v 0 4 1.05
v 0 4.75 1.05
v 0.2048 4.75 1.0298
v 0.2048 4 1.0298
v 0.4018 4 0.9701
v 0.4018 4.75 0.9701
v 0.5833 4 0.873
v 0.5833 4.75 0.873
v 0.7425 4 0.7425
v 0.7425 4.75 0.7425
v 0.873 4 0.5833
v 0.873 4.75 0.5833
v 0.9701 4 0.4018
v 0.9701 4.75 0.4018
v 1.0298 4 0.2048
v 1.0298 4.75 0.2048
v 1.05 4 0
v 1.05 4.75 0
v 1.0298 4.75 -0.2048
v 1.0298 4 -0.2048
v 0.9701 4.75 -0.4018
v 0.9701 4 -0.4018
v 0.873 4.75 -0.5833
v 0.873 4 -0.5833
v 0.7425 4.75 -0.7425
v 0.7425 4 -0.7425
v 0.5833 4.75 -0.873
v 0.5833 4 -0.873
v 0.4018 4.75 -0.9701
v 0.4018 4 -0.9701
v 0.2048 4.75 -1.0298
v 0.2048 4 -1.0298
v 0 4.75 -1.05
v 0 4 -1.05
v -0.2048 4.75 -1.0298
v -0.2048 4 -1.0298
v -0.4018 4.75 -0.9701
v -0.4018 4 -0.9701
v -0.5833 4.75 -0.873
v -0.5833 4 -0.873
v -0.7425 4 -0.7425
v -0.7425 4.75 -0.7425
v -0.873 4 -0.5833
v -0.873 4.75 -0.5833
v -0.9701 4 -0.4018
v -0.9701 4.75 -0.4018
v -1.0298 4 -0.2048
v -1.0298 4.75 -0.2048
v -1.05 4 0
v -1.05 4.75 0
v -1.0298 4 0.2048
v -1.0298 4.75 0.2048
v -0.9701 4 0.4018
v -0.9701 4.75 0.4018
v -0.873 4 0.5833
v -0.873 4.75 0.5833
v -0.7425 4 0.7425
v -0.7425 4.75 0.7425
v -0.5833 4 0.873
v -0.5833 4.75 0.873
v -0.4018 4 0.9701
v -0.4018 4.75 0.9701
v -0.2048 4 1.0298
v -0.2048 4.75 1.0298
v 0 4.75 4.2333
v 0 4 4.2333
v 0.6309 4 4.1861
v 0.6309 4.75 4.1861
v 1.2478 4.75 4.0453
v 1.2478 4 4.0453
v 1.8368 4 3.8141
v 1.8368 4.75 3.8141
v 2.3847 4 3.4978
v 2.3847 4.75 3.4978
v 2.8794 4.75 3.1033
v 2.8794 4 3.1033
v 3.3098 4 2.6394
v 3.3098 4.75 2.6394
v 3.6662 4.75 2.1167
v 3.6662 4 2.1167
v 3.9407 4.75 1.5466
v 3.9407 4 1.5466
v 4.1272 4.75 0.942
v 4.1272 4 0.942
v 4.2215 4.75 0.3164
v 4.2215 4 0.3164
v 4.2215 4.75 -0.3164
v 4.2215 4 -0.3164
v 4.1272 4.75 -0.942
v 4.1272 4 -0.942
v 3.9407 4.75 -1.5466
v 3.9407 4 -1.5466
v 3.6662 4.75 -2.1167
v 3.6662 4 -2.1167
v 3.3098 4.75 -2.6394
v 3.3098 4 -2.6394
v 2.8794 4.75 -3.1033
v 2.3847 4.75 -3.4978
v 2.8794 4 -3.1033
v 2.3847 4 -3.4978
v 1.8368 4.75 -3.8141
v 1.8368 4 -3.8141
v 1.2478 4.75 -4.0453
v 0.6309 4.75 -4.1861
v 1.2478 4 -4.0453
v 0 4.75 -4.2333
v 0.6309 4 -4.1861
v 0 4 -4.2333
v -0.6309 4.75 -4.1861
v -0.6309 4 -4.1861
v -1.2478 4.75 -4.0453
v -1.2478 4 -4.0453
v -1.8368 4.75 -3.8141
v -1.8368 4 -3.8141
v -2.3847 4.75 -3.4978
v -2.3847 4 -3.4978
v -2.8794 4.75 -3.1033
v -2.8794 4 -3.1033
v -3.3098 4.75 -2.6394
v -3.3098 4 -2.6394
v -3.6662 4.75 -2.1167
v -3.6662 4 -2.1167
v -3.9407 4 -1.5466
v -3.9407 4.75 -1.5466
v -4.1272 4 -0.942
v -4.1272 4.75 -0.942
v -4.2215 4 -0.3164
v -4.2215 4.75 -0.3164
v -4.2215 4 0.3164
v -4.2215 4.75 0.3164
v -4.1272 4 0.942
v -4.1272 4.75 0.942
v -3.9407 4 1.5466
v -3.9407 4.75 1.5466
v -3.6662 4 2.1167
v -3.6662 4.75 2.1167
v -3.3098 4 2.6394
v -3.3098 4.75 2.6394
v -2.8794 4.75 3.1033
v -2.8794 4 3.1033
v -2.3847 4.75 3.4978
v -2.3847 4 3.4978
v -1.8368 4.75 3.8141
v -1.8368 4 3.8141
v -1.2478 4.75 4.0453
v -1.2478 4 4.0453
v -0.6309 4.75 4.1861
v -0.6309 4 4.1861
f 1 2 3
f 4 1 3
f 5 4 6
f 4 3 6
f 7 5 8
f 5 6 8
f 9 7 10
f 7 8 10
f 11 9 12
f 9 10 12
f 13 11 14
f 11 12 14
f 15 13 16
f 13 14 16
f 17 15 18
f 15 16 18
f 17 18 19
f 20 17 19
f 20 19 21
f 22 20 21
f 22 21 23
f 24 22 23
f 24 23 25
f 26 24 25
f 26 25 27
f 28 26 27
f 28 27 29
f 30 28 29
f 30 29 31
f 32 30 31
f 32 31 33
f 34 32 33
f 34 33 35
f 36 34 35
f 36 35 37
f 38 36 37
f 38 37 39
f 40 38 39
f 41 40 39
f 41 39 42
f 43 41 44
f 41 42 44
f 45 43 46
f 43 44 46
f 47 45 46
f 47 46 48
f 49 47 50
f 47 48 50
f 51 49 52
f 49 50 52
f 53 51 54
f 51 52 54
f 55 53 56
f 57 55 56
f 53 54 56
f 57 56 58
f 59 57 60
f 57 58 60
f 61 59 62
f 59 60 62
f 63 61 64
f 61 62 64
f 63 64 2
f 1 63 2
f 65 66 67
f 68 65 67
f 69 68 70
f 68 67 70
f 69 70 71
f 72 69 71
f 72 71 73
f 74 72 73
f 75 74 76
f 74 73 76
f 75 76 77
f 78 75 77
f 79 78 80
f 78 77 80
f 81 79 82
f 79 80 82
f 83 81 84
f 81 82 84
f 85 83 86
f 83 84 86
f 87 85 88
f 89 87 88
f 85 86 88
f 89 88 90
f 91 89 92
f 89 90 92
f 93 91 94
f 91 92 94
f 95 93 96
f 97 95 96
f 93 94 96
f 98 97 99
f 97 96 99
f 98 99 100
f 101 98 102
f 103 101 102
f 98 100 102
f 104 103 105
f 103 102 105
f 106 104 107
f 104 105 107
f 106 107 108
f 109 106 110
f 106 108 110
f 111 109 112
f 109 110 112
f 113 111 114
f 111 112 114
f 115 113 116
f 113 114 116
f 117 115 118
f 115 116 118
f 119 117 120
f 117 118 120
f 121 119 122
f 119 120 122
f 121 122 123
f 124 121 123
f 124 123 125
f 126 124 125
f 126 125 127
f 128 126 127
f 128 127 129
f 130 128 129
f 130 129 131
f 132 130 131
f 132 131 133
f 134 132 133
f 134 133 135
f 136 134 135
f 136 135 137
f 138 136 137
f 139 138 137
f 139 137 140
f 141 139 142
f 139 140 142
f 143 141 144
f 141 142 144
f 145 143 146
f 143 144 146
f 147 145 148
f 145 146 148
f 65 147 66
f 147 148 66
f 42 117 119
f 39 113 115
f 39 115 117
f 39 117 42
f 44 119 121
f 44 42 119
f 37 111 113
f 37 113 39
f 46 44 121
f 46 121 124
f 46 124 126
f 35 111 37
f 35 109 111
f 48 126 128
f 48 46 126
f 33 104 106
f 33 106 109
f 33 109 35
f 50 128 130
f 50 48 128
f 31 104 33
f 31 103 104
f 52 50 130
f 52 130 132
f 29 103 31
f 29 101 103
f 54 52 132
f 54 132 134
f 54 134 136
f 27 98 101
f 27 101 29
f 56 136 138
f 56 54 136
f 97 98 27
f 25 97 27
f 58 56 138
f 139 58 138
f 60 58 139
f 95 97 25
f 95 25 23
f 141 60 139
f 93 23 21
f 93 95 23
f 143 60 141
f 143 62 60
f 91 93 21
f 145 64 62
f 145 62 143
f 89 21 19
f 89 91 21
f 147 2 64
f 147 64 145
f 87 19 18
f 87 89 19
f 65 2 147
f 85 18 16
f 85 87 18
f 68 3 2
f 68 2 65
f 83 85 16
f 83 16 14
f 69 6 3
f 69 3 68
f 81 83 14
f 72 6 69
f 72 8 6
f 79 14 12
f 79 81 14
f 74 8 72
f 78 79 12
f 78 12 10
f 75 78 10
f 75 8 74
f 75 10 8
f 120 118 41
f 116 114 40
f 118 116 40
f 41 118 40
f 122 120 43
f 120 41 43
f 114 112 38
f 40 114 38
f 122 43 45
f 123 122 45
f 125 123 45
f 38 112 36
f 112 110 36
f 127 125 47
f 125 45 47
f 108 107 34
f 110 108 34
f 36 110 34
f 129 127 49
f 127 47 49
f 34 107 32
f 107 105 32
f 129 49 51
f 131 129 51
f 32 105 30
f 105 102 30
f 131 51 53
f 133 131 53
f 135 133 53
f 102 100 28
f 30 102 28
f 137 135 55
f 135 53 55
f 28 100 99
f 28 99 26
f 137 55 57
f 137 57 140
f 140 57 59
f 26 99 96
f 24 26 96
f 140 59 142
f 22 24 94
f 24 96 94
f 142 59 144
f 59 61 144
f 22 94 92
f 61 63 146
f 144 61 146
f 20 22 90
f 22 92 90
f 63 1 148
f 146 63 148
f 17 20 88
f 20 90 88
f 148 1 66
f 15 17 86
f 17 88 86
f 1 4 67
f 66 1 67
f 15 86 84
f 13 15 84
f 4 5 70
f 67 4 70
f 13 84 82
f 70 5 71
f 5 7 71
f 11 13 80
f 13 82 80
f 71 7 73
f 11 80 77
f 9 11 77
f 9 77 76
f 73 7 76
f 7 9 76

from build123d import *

# Parameters (mm, degrees)
SKETCH1_R           = 2.921
BOSS_EXTRUDE1_DEPTH = 4.000000128
SKETCH2_R           = 4.2333418
BOSS_EXTRUDE2_DEPTH = 0.7499985
SKETCH3_R           = 1.05
CUT_EXTRUDE1_DEPTH  = 8.642306756
SKETCH4_R           = 2.921
CUT_EXTRUDE2_DEPTH  = 4.000000128


with BuildPart() as part:
    # Sketch1 → Boss-Extrude1 (new body)
    with BuildSketch(Plane(origin=(0, 0, 0), x_dir=(1, 0, 0), z_dir=(0, 1, 0))):
        with Locations(Location((0, 0, 0), (0, 0, 270))):
            Circle(SKETCH1_R)
    extrude(amount=BOSS_EXTRUDE1_DEPTH)

    # Sketch2 → Boss-Extrude2 (add)
    with BuildSketch(Plane(origin=(0, 4.000000128, 0), x_dir=(1, 0, 0), z_dir=(0, 1, 0))):
        with Locations(Location((0, 0, 0), (0, 0, 270))):
            Circle(SKETCH2_R)
    extrude(amount=BOSS_EXTRUDE2_DEPTH)

    # Sketch3 → Cut-Extrude1 (cut, through all)
    with BuildSketch(Plane(origin=(0, 4.749998628, 0), x_dir=(1, 0, 0), z_dir=(0, 1, 0))):
        with Locations(Location((0, 0, 0), (0, 0, 270))):
            Circle(SKETCH3_R)
    extrude(amount=-CUT_EXTRUDE1_DEPTH, mode=Mode.SUBTRACT)

    # Sketch4 → Cut-Extrude2 (cut)
    with BuildSketch(Plane.XZ):
        Circle(SKETCH4_R)
    extrude(amount=-CUT_EXTRUDE2_DEPTH, mode=Mode.SUBTRACT)


solid = part.part
